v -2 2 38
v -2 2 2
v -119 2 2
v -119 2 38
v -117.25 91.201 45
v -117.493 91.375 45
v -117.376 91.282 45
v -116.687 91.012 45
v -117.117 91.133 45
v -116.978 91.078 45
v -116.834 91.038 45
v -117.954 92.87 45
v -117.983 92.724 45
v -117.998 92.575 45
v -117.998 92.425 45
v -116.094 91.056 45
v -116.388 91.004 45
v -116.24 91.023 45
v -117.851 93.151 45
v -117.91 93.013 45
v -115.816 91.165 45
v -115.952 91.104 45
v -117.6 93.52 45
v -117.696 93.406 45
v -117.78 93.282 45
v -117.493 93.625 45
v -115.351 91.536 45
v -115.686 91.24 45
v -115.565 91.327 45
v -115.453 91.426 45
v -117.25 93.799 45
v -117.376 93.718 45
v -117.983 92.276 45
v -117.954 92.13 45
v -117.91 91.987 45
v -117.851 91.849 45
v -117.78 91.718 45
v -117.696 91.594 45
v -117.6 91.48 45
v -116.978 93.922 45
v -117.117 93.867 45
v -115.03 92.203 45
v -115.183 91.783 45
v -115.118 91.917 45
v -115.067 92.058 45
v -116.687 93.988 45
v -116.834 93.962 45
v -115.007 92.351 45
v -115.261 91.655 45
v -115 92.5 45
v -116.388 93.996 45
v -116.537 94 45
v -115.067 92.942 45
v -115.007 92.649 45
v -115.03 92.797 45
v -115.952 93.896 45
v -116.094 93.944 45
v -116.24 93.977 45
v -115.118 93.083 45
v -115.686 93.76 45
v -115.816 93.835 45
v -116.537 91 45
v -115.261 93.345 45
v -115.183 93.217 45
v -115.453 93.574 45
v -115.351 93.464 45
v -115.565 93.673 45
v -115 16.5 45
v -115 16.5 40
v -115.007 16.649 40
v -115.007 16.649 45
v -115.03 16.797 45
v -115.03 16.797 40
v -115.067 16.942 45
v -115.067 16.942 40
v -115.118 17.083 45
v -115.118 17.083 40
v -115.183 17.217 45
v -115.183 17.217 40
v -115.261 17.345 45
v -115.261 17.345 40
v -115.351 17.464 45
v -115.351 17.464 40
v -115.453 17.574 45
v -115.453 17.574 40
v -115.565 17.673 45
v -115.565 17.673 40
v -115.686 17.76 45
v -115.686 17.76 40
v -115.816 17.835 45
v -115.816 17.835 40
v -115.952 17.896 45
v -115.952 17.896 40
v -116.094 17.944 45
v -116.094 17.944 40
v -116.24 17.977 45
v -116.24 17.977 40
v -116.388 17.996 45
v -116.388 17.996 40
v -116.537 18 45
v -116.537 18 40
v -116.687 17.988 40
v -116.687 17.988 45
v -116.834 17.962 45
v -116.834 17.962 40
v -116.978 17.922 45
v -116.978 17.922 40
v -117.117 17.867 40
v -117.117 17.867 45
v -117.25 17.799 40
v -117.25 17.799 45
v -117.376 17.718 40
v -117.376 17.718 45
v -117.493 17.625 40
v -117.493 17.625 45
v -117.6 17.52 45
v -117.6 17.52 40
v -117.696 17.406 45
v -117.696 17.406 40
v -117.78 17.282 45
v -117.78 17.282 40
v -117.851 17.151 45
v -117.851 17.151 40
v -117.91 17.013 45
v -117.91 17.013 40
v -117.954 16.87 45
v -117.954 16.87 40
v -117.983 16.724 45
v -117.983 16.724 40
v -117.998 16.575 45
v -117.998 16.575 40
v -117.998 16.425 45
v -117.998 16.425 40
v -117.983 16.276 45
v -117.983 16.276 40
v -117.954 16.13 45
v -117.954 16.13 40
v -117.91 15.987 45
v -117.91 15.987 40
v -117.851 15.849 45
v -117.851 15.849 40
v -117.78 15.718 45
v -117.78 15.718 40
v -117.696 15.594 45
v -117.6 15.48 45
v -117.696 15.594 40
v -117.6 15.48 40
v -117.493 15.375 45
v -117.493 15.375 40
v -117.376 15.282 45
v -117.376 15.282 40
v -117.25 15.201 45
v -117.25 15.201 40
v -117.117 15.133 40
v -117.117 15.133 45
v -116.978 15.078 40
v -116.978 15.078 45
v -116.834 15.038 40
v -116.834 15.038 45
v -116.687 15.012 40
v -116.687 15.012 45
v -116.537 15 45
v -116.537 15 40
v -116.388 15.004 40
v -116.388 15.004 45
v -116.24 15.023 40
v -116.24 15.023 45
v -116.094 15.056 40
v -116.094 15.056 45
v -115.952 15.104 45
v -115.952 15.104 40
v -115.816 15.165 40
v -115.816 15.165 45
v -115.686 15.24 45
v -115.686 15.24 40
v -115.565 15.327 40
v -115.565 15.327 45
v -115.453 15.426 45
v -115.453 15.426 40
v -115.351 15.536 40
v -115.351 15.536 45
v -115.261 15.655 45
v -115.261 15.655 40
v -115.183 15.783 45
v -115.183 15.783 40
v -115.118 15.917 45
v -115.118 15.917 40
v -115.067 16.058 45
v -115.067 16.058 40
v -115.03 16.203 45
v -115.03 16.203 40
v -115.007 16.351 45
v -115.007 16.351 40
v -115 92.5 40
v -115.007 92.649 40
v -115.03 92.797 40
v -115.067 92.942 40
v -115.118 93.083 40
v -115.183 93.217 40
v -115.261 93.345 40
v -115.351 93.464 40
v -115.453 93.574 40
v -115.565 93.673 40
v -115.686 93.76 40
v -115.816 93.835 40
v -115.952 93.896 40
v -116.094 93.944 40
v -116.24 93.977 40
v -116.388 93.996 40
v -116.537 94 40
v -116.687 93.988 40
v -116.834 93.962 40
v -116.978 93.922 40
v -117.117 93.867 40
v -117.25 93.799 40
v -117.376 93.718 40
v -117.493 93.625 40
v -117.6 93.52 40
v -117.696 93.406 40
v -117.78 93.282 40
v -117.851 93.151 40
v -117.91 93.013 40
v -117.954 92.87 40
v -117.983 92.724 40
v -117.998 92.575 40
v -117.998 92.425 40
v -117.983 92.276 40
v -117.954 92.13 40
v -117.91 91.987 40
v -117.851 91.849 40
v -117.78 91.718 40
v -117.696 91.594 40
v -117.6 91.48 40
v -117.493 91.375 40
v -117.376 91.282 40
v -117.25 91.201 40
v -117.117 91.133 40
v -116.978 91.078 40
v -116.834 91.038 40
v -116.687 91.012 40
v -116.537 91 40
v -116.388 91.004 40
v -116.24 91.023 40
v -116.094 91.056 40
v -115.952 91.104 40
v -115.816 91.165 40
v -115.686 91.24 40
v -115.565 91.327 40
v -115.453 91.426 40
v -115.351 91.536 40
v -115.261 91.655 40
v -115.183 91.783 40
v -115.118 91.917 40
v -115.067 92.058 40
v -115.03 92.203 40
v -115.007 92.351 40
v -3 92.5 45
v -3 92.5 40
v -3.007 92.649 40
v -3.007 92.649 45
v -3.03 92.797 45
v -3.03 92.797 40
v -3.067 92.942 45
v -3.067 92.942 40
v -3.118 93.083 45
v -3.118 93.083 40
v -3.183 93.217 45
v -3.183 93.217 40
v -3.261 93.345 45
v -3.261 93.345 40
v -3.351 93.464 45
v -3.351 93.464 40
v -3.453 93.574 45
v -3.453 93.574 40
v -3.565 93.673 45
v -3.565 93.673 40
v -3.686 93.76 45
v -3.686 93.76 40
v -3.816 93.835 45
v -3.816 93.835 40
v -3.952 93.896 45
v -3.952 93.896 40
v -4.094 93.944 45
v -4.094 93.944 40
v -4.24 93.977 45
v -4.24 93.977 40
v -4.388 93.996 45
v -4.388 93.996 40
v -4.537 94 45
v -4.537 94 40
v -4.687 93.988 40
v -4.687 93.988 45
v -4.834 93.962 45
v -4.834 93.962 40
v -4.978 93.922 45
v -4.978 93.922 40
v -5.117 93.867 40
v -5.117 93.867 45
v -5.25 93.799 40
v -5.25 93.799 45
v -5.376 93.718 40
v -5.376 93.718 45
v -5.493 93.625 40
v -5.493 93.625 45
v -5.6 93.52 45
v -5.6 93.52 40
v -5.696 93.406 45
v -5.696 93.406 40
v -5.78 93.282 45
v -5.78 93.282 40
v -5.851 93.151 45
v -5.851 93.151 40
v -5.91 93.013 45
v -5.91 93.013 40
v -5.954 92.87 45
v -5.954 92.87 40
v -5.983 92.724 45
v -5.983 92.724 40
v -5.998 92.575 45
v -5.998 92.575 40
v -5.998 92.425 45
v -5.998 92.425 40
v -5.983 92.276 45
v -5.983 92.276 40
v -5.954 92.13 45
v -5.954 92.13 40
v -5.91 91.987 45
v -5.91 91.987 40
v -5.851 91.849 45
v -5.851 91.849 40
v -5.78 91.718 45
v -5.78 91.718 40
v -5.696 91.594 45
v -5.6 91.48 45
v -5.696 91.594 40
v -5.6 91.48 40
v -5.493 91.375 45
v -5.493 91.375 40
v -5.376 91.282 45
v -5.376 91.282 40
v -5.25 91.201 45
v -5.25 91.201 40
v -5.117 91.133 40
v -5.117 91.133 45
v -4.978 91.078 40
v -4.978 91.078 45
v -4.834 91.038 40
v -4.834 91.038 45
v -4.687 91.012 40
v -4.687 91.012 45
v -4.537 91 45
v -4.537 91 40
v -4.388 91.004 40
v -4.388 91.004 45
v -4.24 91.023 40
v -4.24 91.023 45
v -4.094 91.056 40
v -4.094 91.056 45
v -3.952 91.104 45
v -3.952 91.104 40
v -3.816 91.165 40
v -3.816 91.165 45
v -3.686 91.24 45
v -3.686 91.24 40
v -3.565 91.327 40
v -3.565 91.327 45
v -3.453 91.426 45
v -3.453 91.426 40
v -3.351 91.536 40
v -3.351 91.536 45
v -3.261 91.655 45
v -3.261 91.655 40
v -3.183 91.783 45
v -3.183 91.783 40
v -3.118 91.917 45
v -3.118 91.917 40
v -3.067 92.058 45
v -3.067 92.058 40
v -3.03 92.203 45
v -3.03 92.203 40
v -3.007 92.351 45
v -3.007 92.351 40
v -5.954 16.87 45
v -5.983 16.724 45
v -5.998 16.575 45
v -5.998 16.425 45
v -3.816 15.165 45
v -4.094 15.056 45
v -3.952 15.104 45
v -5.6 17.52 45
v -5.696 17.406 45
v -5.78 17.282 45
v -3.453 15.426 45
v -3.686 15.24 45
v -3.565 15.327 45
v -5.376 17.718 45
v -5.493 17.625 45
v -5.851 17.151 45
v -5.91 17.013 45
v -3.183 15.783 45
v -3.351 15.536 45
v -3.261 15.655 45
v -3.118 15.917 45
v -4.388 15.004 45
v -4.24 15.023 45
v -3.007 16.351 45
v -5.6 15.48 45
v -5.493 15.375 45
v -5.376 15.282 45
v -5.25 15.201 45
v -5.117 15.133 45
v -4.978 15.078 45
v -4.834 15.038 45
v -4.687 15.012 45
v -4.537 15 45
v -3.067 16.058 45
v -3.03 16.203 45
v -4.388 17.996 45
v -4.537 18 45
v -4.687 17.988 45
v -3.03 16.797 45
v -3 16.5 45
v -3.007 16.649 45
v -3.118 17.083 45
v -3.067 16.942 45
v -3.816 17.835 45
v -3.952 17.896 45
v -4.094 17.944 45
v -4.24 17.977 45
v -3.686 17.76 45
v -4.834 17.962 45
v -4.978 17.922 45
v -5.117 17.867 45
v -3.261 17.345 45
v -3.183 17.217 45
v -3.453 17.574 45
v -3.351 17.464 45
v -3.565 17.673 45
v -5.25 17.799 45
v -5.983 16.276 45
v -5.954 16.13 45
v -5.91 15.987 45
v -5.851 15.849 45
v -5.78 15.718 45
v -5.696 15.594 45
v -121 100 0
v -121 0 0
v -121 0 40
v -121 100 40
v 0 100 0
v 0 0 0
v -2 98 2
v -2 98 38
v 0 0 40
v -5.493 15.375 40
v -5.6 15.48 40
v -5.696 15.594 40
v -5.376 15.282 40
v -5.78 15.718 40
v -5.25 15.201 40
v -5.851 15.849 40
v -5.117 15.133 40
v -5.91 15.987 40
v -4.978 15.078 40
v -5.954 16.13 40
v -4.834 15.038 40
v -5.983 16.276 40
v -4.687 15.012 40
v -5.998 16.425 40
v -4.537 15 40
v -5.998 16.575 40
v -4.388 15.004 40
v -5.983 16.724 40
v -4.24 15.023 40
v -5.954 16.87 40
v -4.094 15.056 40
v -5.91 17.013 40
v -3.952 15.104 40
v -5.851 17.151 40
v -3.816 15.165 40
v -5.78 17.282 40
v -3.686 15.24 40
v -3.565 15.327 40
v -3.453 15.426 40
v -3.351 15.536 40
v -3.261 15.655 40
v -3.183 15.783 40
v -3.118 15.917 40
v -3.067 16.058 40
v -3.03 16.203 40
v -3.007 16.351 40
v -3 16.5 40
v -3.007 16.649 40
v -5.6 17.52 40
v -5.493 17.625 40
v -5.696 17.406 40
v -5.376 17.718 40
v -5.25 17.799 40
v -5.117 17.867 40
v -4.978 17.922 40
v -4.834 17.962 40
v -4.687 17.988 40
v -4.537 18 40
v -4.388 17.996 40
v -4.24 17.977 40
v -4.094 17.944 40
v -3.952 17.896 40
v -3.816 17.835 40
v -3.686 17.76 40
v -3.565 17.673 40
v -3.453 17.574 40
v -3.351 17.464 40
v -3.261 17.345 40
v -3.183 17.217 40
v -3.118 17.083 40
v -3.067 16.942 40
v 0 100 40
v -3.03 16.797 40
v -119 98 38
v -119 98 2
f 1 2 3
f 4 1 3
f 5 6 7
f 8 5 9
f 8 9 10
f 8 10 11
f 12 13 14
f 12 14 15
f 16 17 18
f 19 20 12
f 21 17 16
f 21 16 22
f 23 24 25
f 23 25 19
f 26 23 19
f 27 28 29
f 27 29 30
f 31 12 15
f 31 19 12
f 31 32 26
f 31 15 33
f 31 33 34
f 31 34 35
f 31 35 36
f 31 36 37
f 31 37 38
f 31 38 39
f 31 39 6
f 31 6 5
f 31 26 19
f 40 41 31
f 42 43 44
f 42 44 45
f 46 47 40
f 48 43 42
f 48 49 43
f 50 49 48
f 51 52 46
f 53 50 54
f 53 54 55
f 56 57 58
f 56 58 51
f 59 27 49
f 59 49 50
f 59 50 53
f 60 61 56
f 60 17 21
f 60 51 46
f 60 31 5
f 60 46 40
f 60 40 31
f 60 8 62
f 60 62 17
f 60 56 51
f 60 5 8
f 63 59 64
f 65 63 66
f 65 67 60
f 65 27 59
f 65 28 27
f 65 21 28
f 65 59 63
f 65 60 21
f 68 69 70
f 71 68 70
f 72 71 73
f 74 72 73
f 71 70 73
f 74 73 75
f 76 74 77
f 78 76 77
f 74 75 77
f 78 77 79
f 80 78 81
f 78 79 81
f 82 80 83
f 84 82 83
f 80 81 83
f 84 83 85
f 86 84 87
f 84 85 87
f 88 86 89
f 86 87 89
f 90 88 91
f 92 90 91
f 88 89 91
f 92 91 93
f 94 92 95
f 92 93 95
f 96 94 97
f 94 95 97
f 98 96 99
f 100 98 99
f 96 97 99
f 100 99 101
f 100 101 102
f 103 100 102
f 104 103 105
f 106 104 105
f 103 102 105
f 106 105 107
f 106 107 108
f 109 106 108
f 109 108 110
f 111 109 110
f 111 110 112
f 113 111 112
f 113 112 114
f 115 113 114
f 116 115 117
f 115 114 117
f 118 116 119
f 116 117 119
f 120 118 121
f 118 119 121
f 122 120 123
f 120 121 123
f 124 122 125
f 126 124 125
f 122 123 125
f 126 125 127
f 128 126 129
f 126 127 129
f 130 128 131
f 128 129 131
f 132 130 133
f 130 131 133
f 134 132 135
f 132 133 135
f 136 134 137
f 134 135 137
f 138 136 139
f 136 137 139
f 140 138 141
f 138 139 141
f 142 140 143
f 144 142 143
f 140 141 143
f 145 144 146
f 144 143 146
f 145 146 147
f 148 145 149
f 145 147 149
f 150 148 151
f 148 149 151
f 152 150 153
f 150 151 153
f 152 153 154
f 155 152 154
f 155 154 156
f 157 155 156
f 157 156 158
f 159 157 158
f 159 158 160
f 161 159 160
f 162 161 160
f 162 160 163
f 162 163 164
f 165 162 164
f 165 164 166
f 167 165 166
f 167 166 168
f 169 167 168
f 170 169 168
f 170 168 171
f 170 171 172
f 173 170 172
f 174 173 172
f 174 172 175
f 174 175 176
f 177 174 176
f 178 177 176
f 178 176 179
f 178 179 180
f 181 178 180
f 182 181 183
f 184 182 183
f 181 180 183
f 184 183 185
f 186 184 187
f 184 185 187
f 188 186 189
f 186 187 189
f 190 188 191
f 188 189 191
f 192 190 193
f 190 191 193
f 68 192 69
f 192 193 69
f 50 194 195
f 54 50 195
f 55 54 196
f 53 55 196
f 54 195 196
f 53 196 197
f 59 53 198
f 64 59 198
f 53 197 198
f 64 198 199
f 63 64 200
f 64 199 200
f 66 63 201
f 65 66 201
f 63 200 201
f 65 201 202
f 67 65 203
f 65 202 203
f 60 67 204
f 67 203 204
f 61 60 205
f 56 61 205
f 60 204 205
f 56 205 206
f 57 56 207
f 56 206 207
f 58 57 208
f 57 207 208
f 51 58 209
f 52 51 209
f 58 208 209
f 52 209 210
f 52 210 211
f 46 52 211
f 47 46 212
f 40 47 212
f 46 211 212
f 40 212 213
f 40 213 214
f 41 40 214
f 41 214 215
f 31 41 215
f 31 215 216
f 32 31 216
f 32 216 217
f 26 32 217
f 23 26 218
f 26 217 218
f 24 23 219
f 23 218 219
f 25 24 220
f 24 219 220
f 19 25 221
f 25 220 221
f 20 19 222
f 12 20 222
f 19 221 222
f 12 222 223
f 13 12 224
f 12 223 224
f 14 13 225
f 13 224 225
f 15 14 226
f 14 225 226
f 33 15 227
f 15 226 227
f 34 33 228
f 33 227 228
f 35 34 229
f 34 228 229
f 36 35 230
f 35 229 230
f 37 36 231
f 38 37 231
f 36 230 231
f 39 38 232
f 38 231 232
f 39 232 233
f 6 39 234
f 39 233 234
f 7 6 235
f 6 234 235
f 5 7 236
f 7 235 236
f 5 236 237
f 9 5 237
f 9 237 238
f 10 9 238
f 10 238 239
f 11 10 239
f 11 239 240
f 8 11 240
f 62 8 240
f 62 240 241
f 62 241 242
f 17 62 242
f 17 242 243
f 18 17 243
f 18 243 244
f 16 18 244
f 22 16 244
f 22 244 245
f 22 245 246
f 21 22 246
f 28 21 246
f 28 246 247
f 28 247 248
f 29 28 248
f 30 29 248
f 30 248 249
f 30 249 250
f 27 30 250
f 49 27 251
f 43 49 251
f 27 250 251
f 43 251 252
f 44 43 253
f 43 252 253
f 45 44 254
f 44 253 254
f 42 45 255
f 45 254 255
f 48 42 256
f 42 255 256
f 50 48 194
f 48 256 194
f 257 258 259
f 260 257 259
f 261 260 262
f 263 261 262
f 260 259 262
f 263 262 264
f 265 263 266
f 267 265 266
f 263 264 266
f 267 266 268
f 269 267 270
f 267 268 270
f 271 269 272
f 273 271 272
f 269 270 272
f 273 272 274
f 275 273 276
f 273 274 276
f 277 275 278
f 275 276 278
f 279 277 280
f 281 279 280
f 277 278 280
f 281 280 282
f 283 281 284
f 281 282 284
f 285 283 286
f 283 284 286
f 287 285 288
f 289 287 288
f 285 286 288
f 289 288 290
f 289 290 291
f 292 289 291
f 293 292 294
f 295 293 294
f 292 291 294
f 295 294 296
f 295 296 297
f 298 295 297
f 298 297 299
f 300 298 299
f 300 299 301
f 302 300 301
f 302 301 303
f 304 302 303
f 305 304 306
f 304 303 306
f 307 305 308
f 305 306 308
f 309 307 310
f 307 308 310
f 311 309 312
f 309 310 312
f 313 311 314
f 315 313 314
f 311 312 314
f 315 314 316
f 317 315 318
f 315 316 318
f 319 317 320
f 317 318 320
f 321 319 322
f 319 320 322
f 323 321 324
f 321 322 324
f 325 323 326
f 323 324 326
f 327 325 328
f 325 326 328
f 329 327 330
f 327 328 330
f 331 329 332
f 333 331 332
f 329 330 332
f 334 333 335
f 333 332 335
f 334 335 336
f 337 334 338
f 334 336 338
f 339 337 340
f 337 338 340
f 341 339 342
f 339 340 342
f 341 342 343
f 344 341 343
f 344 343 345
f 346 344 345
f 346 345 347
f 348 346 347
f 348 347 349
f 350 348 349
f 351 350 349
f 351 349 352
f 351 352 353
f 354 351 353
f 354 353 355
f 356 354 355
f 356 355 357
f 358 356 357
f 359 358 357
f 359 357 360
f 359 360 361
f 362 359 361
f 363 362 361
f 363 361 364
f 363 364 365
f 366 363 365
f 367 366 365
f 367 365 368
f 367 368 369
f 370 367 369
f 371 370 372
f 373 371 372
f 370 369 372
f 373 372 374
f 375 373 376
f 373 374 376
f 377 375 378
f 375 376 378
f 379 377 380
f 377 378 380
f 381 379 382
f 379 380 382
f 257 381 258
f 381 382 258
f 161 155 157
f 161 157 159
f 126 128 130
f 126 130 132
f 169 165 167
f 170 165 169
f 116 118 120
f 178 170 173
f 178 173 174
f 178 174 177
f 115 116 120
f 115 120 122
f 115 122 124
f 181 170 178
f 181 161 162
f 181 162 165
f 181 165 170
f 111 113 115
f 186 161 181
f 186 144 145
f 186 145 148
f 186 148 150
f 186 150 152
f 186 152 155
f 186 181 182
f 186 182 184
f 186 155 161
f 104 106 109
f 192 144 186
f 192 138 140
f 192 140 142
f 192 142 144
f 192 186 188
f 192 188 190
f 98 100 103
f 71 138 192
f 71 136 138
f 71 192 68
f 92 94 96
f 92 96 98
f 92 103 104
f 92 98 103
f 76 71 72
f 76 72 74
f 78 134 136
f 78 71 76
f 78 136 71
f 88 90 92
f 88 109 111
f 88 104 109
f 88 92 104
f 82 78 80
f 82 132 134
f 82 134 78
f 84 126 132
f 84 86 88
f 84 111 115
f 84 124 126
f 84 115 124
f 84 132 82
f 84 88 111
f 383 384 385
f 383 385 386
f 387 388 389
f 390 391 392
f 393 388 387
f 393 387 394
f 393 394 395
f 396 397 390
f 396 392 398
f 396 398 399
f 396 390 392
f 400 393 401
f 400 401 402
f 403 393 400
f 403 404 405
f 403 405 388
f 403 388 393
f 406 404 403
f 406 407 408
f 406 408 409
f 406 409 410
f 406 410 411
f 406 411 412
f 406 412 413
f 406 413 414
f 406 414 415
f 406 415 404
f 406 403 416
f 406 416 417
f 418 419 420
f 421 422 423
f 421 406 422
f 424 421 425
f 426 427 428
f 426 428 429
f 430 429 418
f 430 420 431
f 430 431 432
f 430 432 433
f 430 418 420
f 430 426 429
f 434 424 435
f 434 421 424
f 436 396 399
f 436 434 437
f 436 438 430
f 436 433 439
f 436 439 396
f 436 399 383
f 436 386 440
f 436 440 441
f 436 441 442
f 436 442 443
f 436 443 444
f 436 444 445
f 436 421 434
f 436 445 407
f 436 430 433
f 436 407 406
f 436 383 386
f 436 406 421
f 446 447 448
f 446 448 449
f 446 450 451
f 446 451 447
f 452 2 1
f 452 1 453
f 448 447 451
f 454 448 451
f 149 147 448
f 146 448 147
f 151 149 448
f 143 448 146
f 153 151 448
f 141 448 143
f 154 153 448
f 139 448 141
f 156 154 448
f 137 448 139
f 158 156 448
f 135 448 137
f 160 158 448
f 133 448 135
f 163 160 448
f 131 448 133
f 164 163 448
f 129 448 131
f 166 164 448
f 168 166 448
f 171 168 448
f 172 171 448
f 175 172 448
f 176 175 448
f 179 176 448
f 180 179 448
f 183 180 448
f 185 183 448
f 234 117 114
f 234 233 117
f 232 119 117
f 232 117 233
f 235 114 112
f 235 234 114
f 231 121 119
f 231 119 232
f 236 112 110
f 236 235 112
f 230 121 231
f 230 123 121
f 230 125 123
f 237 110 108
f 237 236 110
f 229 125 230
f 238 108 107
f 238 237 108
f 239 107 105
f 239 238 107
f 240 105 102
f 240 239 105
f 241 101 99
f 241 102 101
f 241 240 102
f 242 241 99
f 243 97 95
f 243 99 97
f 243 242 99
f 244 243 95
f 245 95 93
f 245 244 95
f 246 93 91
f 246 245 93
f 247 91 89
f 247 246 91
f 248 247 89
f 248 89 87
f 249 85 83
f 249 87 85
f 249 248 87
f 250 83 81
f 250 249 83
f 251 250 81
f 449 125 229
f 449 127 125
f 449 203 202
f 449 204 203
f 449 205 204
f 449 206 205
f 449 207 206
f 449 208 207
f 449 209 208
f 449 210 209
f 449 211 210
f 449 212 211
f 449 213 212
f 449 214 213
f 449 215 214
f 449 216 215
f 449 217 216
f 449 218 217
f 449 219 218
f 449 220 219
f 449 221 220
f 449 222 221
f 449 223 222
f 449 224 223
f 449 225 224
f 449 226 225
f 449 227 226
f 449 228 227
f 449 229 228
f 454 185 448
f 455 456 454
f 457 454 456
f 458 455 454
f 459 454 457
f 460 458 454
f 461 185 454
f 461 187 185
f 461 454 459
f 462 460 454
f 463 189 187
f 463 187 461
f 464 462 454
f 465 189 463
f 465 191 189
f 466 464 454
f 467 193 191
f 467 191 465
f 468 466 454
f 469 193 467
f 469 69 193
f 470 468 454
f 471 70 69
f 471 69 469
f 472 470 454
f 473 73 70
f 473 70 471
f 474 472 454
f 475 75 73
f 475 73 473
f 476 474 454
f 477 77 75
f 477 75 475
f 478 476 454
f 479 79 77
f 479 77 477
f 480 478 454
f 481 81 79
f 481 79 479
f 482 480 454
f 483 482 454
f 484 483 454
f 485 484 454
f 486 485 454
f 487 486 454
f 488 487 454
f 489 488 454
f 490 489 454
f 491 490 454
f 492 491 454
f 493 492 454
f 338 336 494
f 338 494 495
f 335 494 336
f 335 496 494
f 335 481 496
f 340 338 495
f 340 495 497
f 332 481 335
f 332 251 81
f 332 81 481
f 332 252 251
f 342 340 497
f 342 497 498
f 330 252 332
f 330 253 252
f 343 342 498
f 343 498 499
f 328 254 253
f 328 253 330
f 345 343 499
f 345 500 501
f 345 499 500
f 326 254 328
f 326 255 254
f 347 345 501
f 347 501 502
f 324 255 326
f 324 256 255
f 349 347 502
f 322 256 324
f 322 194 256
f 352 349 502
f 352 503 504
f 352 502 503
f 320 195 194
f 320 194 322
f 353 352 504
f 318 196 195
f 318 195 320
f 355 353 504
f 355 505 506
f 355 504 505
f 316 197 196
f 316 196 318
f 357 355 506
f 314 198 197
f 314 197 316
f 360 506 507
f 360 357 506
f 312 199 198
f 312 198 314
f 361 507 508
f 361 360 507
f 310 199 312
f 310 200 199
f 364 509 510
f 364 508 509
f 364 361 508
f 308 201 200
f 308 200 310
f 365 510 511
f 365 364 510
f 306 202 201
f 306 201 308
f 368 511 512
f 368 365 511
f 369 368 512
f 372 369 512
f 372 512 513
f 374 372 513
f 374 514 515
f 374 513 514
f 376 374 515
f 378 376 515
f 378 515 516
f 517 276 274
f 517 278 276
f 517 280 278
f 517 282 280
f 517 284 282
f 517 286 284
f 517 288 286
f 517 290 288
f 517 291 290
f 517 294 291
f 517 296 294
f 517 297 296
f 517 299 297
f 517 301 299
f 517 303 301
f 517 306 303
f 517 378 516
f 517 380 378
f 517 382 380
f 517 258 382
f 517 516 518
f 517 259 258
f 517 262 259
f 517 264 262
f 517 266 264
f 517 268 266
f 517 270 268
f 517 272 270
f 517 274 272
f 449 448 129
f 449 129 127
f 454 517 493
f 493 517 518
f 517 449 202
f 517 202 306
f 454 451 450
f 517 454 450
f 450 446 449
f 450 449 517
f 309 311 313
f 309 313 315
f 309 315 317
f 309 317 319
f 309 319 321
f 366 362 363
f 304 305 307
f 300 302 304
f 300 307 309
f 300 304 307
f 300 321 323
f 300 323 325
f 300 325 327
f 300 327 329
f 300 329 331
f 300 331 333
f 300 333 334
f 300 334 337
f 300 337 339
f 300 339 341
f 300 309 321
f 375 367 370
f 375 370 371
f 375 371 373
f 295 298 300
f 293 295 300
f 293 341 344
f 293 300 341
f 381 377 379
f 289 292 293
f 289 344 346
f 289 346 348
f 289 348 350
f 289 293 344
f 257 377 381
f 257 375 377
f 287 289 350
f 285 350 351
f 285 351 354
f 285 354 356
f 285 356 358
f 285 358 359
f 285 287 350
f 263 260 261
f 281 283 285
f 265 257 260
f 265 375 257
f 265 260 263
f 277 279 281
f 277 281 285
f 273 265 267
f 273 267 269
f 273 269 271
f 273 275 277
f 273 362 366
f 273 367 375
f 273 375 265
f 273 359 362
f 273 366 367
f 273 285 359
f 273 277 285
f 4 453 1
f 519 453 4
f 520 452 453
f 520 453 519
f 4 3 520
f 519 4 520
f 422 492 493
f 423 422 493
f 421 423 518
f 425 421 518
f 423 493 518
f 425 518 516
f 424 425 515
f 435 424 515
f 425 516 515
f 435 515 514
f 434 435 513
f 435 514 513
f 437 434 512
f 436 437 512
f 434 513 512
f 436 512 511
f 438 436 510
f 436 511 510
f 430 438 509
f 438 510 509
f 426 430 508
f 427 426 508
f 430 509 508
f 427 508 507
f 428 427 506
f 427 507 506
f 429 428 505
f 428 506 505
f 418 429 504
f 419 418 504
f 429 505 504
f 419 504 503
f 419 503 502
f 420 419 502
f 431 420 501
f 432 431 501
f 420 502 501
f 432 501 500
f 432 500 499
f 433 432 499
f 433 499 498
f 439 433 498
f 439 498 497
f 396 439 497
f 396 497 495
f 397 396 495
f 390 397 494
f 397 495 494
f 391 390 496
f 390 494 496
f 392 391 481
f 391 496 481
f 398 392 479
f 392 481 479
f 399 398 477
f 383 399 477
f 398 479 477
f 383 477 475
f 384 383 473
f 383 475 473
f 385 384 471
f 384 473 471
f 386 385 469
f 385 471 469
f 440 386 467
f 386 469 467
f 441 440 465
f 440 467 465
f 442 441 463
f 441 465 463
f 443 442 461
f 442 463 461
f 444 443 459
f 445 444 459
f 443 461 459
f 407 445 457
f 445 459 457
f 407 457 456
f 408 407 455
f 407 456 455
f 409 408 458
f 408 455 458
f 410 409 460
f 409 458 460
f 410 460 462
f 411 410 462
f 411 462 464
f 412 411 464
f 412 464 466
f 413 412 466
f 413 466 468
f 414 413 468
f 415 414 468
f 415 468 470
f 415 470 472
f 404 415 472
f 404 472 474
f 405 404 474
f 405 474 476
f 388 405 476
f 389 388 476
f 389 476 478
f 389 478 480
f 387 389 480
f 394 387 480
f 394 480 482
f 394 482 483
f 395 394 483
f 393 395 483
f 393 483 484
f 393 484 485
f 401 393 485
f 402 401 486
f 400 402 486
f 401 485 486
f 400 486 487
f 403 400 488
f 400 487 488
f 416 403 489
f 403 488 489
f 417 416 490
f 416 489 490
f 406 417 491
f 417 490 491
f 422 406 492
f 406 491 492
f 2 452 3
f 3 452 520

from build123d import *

# Parameters (mm, degrees)
SKETCH_1_W          = 121
SKETCH_1_H          = 100
EXTRUDE_1_DEPTH     = 40
SKETCH_2_R          = 1.5
EXTRUDE_2_DEPTH     = 5
SKETCH_3_W          = 117
SKETCH_3_H          = 96
CUT_EXTRUDE_1_DEPTH = 38
SKETCH_4_W          = 117
SKETCH_4_H          = 96
EXTRUDE_3_DEPTH     = 2


with BuildPart() as part:
    # 草图1 → 凸台-拉伸1 (new body)
    with BuildSketch(Plane.XY):
        with Locations((-60.5, 50)):
            Rectangle(SKETCH_1_W, SKETCH_1_H)
    extrude(amount=EXTRUDE_1_DEPTH)

    # 草图2 → 凸台-拉伸2 (add)
    with BuildSketch(Plane.XY.offset(40)):
        with Locations((-116.5, 92.5)):
            Circle(SKETCH_2_R)
        with Locations((-4.5, 92.5)):
            Circle(SKETCH_2_R)
        with Locations((-116.5, 16.5)):
            Circle(SKETCH_2_R)
        with Locations((-4.5, 16.5)):
            Circle(SKETCH_2_R)
    extrude(amount=EXTRUDE_2_DEPTH)

    # 草图3 → 切除-拉伸1 (cut)
    with BuildSketch(Plane(origin=(0, 0, 0), x_dir=(-1, 0, 0), z_dir=(0, 0, -1))):
        with Locations((60.5, 50)):
            Rectangle(SKETCH_3_W, SKETCH_3_H)
    extrude(amount=-CUT_EXTRUDE_1_DEPTH, mode=Mode.SUBTRACT)

    # 草图4 → 凸台-拉伸3 (add)
    with BuildSketch(Plane(origin=(0, 0, 0), x_dir=(-1, 0, 0), z_dir=(0, 0, -1))):
        with Locations((60.5, 50)):
            Rectangle(SKETCH_4_W, SKETCH_4_H)
    extrude(amount=-EXTRUDE_3_DEPTH)


solid = part.part
